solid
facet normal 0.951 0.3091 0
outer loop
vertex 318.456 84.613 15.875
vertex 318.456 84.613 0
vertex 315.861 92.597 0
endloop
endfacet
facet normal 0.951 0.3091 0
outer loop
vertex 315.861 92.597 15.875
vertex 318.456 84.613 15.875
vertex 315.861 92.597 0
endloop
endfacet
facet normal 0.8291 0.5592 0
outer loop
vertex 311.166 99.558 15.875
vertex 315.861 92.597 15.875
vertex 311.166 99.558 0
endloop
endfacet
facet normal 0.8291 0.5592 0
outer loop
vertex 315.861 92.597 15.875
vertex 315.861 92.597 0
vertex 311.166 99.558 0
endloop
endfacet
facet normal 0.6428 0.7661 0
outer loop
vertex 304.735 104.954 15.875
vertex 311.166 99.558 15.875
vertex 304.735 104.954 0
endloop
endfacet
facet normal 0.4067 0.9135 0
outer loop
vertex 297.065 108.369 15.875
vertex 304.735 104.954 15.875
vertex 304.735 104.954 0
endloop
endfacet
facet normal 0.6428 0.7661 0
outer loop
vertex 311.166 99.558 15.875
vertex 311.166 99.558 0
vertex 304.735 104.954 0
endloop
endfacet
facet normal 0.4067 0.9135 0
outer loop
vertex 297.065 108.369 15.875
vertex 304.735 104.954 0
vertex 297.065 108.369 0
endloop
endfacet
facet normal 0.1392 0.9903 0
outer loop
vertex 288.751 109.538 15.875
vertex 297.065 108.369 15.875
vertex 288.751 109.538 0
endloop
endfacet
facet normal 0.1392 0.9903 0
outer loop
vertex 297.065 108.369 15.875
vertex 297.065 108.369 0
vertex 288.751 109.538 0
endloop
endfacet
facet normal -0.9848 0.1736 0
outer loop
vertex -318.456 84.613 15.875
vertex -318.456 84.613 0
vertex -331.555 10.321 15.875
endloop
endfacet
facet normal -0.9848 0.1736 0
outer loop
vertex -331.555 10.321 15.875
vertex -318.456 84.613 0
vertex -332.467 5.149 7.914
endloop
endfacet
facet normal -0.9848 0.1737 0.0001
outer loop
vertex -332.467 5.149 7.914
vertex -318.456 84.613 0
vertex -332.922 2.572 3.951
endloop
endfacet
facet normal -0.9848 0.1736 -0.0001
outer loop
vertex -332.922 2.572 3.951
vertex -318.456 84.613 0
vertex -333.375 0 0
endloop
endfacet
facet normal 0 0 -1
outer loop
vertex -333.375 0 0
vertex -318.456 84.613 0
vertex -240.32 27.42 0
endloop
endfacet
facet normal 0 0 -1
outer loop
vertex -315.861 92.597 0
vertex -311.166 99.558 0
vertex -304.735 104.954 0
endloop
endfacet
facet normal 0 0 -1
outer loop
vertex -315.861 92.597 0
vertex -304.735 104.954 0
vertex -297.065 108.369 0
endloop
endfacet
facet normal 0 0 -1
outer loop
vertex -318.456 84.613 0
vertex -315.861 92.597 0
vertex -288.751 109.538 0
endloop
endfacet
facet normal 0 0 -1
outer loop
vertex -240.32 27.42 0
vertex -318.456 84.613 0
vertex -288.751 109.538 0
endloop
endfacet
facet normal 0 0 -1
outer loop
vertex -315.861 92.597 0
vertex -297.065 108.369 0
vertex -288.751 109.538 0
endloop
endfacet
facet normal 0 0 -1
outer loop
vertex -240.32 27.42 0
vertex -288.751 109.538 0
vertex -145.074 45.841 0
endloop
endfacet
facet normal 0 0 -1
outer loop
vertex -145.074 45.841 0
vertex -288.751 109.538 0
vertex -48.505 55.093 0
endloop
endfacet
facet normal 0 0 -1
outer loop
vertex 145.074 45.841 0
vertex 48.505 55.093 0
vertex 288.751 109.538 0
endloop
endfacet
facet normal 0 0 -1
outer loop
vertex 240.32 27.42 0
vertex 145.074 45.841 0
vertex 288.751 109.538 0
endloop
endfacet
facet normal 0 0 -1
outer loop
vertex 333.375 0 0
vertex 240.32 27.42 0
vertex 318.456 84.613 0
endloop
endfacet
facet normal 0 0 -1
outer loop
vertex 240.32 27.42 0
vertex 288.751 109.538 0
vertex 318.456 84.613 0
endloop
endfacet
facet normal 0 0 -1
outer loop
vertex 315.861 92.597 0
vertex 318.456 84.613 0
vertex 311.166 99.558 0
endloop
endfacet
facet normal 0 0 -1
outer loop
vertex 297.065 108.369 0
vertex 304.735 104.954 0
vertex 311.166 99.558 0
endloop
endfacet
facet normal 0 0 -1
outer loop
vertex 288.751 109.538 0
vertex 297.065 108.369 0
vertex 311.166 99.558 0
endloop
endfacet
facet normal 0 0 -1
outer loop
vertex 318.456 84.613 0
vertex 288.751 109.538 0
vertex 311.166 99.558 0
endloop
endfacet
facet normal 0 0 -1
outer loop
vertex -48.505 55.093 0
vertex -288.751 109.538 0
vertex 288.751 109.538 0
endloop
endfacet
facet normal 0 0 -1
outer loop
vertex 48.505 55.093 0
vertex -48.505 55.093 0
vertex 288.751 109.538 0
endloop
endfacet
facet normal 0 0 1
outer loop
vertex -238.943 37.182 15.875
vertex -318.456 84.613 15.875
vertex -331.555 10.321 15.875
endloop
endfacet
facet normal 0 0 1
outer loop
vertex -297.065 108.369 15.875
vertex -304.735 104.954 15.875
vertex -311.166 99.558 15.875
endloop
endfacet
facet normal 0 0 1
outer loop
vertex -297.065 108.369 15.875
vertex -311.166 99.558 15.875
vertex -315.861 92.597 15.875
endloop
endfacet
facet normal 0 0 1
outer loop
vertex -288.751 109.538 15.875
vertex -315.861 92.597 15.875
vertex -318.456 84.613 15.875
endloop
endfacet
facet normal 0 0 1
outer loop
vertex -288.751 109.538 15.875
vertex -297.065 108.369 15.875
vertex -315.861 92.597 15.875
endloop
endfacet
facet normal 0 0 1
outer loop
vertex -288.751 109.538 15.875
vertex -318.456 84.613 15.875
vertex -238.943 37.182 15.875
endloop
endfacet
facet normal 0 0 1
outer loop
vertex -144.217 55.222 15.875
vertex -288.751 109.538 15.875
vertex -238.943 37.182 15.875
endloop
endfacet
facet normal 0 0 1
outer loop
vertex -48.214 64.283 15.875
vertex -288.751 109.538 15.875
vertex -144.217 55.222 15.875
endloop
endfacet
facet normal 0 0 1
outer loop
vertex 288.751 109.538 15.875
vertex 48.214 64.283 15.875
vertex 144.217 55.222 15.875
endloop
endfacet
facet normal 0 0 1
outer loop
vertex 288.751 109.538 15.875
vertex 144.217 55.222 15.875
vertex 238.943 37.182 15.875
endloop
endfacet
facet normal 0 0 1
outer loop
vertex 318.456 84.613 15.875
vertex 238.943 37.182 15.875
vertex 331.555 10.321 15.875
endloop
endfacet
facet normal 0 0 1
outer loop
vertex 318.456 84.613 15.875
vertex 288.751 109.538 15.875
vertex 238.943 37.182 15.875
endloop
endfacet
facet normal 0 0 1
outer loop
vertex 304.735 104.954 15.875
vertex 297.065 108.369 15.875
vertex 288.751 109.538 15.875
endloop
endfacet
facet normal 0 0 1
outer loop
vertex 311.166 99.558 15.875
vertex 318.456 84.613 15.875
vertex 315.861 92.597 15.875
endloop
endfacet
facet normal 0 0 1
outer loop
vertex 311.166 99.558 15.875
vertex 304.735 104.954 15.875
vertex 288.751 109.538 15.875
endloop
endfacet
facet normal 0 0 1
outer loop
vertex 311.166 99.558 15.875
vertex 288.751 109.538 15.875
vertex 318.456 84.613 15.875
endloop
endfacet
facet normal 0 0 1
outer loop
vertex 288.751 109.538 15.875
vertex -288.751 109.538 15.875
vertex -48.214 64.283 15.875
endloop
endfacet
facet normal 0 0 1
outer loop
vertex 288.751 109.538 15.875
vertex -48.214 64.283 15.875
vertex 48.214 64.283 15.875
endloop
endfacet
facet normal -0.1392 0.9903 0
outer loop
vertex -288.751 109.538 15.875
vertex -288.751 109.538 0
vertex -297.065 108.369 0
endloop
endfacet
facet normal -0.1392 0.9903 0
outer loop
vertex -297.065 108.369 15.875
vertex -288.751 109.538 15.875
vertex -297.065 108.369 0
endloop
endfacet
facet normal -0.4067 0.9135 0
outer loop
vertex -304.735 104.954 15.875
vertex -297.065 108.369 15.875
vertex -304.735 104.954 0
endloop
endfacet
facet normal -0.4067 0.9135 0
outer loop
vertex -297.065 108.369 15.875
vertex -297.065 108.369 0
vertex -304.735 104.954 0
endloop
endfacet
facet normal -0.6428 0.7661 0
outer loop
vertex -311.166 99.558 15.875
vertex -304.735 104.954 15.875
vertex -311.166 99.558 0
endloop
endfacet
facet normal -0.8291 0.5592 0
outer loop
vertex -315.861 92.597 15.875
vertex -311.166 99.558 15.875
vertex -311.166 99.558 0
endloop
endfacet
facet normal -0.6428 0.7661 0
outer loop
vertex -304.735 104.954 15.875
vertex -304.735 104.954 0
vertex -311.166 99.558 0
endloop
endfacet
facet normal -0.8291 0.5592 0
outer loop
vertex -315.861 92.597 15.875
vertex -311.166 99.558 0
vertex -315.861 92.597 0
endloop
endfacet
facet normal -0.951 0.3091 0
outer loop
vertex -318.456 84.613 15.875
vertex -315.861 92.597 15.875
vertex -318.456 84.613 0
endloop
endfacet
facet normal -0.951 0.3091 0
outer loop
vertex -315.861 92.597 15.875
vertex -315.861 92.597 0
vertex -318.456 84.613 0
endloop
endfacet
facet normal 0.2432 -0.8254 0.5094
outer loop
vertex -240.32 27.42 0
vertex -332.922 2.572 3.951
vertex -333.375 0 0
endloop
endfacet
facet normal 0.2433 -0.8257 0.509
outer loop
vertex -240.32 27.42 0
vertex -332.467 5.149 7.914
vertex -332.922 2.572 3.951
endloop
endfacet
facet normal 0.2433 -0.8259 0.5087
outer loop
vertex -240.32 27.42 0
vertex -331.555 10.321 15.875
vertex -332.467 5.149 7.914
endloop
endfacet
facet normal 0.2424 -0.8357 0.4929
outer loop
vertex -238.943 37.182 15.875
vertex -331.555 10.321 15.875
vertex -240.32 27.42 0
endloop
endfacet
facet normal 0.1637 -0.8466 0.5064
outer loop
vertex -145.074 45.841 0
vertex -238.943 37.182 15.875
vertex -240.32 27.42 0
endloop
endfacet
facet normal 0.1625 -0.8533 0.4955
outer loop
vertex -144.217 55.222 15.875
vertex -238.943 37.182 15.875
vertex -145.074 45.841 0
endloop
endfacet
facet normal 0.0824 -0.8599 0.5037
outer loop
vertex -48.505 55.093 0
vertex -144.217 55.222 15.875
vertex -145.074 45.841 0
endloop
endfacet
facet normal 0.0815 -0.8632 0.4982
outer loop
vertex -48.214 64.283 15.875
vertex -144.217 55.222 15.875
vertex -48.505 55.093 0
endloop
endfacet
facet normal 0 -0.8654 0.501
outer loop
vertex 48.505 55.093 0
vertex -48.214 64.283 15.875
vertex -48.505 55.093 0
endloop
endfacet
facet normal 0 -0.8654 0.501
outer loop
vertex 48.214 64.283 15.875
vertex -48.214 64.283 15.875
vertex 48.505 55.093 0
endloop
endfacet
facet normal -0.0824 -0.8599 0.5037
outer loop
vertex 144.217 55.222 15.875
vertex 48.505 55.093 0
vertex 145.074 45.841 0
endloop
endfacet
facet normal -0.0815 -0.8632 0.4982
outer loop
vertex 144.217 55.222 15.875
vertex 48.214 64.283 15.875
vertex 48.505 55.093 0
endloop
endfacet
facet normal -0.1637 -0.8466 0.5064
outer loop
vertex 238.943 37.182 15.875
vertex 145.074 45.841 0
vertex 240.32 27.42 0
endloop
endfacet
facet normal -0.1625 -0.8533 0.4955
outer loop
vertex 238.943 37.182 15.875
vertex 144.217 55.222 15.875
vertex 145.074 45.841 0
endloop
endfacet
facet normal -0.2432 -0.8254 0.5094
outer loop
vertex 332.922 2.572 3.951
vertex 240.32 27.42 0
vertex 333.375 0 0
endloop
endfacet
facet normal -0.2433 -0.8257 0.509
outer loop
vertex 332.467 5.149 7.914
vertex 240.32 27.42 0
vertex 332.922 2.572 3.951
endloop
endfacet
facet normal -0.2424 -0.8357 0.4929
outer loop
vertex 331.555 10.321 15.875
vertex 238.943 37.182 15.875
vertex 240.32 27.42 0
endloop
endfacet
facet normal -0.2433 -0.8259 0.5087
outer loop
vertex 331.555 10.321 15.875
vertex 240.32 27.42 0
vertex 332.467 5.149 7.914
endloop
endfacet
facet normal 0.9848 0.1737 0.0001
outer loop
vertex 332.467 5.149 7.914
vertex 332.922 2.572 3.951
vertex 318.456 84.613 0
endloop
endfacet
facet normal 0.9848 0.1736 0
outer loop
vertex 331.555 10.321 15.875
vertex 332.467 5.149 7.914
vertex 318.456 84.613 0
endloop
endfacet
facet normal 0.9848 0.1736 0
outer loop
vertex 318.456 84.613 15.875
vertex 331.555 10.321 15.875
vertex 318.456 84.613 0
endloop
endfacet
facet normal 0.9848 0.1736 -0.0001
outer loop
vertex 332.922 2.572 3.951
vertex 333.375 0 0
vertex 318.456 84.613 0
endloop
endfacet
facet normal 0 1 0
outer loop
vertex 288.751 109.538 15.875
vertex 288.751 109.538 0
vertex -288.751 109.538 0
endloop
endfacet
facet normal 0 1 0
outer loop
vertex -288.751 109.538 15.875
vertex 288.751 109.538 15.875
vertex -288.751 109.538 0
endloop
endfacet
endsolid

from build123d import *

# Parameters (mm, degrees)
F1_DEPTH = 15.875
F2_SIZE2 = 9.165426
F2_SIZE  = 15.87499


# Not quite as in the source:
# - a fillet or chamfer is up to 0.001 mm smaller than in the source, because OpenCascade refuses the exact size


with BuildPart() as f1:
    # F0 (on Top) → F1 (new body)
    with BuildSketch(Plane.XY):
        with BuildLine():
            ThreePointArc((-333.375, 0), (0, 56.2515384878), (333.375, 0))
            Line((333.375, 0), (318.4555045755, 84.6126631589))
            ThreePointArc((318.4555045755, 84.6126631589), (308.1393220024, 102.4808155156), (288.7512407253, 109.5375))
            Line((288.7512407253, 109.5375), (-288.7512407253, 109.5375))
            ThreePointArc((-288.7512407253, 109.5375), (-308.1393220024, 102.4808155156), (-318.4555045755, 84.6126631589))
            Line((-318.4555045755, 84.6126631589), (-333.375, 0))
        make_face()
    extrude(amount=F1_DEPTH)

    # F2 (size 15.875 and 9.1654355234 in the source; OpenCascade refuses exactly that, so slightly less here)
    f2_edges = [f1.edges().sort_by_distance(p)[0] for p in [
        (0, 56.251538, 15.875),
    ]]
    f2_side = f1.faces().sort_by_distance((0, 56.251538, 7.9375))[0]
    chamfer(f2_edges, length=F2_SIZE, length2=F2_SIZE2, reference=f2_side)


solid = f1.part
